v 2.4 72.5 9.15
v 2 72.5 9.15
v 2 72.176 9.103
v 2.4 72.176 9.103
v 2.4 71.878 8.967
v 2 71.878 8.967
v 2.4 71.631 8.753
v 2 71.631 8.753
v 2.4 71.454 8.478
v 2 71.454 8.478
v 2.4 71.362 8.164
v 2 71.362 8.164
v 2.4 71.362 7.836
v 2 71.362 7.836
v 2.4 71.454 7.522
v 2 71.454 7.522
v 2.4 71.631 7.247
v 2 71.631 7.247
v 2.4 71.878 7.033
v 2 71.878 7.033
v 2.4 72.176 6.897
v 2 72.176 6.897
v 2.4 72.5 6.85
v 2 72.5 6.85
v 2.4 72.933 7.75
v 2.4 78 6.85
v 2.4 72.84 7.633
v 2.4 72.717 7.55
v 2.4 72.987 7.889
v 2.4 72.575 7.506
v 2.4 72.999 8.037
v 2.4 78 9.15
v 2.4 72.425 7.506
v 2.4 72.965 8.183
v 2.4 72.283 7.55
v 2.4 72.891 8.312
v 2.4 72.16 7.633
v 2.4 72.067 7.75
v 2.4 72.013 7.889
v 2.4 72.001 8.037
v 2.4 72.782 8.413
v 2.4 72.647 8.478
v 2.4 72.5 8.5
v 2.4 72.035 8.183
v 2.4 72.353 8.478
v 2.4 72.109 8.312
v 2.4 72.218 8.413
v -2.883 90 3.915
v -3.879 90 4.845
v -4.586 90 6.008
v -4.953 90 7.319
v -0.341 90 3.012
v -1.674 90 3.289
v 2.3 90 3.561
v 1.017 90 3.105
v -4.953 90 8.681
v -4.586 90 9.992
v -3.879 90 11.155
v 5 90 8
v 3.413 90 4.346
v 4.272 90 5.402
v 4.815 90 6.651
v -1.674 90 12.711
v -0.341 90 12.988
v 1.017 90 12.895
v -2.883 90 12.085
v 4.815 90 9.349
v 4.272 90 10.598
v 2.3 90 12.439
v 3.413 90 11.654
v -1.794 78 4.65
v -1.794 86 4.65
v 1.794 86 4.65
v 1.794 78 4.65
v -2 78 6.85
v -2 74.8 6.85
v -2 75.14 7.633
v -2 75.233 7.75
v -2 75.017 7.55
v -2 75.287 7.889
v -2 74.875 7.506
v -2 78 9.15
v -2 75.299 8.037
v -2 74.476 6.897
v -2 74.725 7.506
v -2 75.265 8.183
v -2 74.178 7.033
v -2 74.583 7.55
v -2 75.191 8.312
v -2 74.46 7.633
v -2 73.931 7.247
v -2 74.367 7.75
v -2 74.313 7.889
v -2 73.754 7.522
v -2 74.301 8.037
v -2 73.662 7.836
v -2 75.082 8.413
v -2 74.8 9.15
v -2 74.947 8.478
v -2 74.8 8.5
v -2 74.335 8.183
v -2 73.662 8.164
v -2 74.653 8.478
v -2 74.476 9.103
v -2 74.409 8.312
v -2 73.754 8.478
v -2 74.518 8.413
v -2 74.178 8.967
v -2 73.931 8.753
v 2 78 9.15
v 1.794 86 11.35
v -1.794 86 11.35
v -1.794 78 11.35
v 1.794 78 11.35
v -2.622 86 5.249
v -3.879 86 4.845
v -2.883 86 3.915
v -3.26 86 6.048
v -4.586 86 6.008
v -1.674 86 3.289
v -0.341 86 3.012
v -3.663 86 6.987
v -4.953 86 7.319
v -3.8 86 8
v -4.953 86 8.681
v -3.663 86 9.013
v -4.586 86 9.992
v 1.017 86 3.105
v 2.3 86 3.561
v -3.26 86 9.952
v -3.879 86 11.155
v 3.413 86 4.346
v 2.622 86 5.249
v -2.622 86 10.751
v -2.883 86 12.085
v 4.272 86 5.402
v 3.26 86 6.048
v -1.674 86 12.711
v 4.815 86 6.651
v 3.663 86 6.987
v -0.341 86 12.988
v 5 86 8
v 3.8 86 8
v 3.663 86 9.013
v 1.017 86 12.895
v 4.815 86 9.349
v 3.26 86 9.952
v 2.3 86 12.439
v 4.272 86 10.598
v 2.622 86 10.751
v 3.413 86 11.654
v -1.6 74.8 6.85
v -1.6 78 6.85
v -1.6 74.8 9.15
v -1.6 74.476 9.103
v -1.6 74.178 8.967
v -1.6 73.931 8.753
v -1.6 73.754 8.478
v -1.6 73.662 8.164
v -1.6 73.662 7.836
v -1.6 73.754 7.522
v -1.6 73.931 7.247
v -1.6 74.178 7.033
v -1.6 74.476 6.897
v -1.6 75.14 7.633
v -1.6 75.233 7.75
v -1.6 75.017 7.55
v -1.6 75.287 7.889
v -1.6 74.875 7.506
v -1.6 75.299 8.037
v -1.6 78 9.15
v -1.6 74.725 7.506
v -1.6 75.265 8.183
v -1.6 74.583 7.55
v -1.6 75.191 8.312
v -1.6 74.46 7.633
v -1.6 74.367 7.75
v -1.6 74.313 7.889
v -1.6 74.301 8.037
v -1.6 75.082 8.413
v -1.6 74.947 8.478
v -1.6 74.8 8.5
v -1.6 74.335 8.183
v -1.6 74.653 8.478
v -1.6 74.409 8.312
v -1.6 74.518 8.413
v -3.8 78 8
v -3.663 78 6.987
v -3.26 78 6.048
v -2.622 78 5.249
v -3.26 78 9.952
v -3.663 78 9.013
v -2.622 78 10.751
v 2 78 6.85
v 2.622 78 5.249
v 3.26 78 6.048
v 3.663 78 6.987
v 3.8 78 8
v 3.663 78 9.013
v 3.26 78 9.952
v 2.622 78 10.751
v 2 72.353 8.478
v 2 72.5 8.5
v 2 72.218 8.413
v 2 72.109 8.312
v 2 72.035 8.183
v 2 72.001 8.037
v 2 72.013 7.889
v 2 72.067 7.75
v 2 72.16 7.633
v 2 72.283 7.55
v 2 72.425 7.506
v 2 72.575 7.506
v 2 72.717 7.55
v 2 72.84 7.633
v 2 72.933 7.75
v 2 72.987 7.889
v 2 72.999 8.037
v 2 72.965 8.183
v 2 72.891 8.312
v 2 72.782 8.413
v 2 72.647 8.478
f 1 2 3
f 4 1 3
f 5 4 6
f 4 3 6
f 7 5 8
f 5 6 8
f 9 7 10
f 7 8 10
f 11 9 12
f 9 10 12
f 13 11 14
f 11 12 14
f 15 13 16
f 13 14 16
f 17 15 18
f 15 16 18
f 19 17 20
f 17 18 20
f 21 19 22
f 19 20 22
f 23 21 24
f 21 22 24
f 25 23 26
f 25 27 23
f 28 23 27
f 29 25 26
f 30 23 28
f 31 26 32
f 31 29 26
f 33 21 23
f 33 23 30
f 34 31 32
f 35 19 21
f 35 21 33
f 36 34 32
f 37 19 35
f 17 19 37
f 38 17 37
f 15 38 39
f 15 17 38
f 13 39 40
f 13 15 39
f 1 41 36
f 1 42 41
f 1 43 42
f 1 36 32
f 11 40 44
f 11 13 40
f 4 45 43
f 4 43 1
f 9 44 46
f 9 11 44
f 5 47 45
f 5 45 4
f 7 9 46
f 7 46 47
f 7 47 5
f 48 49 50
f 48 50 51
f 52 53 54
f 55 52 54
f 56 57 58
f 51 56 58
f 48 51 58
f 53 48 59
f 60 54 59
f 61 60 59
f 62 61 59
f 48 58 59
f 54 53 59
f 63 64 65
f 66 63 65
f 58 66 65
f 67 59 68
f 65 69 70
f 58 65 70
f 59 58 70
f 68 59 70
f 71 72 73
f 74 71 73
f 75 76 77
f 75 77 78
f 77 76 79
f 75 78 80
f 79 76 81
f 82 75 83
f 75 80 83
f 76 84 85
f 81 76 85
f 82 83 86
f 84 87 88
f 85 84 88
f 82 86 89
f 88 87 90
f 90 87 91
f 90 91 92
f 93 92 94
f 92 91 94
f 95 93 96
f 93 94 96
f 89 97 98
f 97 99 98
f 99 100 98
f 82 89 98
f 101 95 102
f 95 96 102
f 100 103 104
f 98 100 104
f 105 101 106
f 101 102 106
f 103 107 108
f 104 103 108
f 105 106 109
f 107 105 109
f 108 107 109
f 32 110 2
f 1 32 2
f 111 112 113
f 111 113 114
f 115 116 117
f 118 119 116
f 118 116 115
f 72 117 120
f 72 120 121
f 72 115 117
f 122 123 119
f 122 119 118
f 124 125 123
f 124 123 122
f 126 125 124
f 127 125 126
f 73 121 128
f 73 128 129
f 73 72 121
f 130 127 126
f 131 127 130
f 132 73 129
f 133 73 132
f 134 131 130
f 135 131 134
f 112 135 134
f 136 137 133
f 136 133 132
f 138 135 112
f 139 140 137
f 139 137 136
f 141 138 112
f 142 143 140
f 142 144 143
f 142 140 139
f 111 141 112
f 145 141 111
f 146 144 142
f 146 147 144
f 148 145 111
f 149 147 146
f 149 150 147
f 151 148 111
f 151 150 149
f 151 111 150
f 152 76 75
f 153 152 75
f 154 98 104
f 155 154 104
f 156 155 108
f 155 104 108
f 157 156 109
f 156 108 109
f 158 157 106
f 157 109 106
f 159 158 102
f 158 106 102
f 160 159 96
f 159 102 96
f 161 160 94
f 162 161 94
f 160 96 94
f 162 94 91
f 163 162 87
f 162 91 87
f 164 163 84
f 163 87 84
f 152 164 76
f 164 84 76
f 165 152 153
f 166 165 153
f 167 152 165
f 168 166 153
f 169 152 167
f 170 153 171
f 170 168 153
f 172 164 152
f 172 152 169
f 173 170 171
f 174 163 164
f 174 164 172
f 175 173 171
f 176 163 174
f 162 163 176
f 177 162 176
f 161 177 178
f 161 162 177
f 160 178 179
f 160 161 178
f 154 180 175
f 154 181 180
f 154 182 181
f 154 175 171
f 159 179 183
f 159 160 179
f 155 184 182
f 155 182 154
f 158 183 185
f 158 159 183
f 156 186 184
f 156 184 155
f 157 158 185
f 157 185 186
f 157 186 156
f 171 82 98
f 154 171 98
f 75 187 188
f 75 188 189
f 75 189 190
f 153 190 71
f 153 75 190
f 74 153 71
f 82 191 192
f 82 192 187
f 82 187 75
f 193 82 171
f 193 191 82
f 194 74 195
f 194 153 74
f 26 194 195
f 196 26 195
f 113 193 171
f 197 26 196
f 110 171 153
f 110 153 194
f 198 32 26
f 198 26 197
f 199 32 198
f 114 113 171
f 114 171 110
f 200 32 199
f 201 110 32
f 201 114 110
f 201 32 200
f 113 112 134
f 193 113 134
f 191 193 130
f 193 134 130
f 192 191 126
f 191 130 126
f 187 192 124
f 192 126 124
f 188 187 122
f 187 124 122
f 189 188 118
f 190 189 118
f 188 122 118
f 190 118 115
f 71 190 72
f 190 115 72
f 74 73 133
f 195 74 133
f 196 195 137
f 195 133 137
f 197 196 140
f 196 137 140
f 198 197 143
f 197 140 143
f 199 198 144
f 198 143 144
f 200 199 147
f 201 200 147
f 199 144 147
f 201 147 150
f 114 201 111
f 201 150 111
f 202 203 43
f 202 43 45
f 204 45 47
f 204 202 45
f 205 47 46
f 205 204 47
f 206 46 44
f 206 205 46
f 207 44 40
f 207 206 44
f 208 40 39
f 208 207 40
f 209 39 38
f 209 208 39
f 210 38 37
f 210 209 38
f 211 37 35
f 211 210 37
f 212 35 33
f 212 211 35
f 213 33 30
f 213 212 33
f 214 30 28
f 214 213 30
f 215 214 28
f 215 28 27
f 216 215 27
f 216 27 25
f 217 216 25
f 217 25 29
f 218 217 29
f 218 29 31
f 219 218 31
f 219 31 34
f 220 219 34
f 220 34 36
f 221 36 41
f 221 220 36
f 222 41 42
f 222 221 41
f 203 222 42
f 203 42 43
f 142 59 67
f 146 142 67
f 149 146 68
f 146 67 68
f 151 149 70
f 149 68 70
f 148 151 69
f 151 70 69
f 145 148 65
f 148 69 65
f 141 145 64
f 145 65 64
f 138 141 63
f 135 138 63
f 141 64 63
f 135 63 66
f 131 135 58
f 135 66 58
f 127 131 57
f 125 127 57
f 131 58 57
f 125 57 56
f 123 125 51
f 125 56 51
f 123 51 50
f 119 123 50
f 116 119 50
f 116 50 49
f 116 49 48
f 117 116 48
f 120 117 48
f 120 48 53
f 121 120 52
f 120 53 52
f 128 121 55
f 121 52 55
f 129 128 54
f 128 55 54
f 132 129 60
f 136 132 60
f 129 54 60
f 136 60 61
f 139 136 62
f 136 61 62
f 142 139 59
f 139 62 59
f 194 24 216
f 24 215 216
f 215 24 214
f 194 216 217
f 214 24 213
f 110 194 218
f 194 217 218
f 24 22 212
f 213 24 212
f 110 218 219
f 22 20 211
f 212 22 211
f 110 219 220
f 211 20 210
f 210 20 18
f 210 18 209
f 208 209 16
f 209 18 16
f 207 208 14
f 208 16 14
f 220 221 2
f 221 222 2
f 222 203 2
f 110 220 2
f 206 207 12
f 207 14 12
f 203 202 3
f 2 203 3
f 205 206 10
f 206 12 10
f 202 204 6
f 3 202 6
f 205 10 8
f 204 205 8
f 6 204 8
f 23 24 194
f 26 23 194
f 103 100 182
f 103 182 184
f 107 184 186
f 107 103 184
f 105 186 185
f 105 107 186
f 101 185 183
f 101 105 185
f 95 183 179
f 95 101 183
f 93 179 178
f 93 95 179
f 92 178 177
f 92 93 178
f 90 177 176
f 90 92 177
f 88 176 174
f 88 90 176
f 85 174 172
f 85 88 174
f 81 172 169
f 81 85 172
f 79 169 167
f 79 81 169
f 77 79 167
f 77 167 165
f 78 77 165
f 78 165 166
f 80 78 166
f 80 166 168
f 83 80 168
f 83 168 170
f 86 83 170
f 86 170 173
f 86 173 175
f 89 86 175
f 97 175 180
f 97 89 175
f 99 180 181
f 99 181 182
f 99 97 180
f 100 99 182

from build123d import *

# Parameters (mm, degrees)
SKETCH002_R            = 5
PAD002_DEPTH           = 4
PAD003_DEPTH           = 8
SKETCH005_R            = 0.5
PAD005_DEPTH           = 0.4
SKETCH004_R            = 0.5
PAD004_DEPTH           = 0.4
FUSION_PLACEMENT_ANGLE = 90


with BuildPart() as body001:
    # Sketch002 → Pad002 (new body)
    with BuildSketch(Plane.XY):
        Circle(SKETCH002_R)
    extrude(amount=PAD002_DEPTH)

    # Sketch003 (on Face3 of Pad002) → Pad003 (join)
    with BuildSketch(Plane.XY.offset(4)):
        with BuildLine():
            ThreePointArc((-1.793739, 3.35), (-3.8, 0), (-1.793739, -3.35))
            Line((-1.793739, -3.35), (1.793739, -3.35))
            ThreePointArc((1.793739, -3.35), (3.8, 0), (1.793739, 3.35))
            Line((-1.793739, 3.35), (1.793739, 3.35))
        make_face()
    extrude(amount=PAD003_DEPTH)


with BuildPart() as body003:
    # Sketch005 → Pad005 (new body)
    with BuildSketch(Plane.YZ):
        with BuildLine():
            Line((-1.15, 15.2), (-1.15, 12))
            Line((-1.15, 12), (1.15, 12))
            Line((1.15, 12), (1.15, 15.2))
            ThreePointArc((1.15, 15.2), (0, 16.35), (-1.15, 15.2))
        make_face()
        with Locations((0, 15.2)):
            Circle(SKETCH005_R, mode=Mode.SUBTRACT)
    extrude(amount=PAD005_DEPTH)


with BuildPart() as body003_1:
    # Body003 placement: moved
    add(body003.part.moved(Location((-2, 0, 0))))


with BuildPart() as power:
    # Sketch004 → Pad004 (new body)
    with BuildSketch(Plane.YZ):
        with BuildLine():
            Line((-1.15, 17.5), (-1.15, 12))
            Line((-1.15, 12), (1.15, 12))
            Line((1.15, 12), (1.15, 17.5))
            ThreePointArc((1.15, 17.5), (0, 18.65), (-1.15, 17.5))
        make_face()
        with Locations((0, 17.5)):
            Circle(SKETCH004_R, mode=Mode.SUBTRACT)
    extrude(amount=PAD004_DEPTH)


with BuildPart() as power_1:
    # Body002 placement: moved
    add(power.part.moved(Location((2, 0, 0))))

    # Fusion: union Body001, Body003
    add(body001.part)
    add(body003_1.part)


with BuildPart() as power_2:
    # Fusion placement: moved
    add(power_1.part.moved(Location((0, 90, 8))).rotate(Axis((0, 90, 8), (1, 0, 0)), FUSION_PLACEMENT_ANGLE))


solid = power_2.part
